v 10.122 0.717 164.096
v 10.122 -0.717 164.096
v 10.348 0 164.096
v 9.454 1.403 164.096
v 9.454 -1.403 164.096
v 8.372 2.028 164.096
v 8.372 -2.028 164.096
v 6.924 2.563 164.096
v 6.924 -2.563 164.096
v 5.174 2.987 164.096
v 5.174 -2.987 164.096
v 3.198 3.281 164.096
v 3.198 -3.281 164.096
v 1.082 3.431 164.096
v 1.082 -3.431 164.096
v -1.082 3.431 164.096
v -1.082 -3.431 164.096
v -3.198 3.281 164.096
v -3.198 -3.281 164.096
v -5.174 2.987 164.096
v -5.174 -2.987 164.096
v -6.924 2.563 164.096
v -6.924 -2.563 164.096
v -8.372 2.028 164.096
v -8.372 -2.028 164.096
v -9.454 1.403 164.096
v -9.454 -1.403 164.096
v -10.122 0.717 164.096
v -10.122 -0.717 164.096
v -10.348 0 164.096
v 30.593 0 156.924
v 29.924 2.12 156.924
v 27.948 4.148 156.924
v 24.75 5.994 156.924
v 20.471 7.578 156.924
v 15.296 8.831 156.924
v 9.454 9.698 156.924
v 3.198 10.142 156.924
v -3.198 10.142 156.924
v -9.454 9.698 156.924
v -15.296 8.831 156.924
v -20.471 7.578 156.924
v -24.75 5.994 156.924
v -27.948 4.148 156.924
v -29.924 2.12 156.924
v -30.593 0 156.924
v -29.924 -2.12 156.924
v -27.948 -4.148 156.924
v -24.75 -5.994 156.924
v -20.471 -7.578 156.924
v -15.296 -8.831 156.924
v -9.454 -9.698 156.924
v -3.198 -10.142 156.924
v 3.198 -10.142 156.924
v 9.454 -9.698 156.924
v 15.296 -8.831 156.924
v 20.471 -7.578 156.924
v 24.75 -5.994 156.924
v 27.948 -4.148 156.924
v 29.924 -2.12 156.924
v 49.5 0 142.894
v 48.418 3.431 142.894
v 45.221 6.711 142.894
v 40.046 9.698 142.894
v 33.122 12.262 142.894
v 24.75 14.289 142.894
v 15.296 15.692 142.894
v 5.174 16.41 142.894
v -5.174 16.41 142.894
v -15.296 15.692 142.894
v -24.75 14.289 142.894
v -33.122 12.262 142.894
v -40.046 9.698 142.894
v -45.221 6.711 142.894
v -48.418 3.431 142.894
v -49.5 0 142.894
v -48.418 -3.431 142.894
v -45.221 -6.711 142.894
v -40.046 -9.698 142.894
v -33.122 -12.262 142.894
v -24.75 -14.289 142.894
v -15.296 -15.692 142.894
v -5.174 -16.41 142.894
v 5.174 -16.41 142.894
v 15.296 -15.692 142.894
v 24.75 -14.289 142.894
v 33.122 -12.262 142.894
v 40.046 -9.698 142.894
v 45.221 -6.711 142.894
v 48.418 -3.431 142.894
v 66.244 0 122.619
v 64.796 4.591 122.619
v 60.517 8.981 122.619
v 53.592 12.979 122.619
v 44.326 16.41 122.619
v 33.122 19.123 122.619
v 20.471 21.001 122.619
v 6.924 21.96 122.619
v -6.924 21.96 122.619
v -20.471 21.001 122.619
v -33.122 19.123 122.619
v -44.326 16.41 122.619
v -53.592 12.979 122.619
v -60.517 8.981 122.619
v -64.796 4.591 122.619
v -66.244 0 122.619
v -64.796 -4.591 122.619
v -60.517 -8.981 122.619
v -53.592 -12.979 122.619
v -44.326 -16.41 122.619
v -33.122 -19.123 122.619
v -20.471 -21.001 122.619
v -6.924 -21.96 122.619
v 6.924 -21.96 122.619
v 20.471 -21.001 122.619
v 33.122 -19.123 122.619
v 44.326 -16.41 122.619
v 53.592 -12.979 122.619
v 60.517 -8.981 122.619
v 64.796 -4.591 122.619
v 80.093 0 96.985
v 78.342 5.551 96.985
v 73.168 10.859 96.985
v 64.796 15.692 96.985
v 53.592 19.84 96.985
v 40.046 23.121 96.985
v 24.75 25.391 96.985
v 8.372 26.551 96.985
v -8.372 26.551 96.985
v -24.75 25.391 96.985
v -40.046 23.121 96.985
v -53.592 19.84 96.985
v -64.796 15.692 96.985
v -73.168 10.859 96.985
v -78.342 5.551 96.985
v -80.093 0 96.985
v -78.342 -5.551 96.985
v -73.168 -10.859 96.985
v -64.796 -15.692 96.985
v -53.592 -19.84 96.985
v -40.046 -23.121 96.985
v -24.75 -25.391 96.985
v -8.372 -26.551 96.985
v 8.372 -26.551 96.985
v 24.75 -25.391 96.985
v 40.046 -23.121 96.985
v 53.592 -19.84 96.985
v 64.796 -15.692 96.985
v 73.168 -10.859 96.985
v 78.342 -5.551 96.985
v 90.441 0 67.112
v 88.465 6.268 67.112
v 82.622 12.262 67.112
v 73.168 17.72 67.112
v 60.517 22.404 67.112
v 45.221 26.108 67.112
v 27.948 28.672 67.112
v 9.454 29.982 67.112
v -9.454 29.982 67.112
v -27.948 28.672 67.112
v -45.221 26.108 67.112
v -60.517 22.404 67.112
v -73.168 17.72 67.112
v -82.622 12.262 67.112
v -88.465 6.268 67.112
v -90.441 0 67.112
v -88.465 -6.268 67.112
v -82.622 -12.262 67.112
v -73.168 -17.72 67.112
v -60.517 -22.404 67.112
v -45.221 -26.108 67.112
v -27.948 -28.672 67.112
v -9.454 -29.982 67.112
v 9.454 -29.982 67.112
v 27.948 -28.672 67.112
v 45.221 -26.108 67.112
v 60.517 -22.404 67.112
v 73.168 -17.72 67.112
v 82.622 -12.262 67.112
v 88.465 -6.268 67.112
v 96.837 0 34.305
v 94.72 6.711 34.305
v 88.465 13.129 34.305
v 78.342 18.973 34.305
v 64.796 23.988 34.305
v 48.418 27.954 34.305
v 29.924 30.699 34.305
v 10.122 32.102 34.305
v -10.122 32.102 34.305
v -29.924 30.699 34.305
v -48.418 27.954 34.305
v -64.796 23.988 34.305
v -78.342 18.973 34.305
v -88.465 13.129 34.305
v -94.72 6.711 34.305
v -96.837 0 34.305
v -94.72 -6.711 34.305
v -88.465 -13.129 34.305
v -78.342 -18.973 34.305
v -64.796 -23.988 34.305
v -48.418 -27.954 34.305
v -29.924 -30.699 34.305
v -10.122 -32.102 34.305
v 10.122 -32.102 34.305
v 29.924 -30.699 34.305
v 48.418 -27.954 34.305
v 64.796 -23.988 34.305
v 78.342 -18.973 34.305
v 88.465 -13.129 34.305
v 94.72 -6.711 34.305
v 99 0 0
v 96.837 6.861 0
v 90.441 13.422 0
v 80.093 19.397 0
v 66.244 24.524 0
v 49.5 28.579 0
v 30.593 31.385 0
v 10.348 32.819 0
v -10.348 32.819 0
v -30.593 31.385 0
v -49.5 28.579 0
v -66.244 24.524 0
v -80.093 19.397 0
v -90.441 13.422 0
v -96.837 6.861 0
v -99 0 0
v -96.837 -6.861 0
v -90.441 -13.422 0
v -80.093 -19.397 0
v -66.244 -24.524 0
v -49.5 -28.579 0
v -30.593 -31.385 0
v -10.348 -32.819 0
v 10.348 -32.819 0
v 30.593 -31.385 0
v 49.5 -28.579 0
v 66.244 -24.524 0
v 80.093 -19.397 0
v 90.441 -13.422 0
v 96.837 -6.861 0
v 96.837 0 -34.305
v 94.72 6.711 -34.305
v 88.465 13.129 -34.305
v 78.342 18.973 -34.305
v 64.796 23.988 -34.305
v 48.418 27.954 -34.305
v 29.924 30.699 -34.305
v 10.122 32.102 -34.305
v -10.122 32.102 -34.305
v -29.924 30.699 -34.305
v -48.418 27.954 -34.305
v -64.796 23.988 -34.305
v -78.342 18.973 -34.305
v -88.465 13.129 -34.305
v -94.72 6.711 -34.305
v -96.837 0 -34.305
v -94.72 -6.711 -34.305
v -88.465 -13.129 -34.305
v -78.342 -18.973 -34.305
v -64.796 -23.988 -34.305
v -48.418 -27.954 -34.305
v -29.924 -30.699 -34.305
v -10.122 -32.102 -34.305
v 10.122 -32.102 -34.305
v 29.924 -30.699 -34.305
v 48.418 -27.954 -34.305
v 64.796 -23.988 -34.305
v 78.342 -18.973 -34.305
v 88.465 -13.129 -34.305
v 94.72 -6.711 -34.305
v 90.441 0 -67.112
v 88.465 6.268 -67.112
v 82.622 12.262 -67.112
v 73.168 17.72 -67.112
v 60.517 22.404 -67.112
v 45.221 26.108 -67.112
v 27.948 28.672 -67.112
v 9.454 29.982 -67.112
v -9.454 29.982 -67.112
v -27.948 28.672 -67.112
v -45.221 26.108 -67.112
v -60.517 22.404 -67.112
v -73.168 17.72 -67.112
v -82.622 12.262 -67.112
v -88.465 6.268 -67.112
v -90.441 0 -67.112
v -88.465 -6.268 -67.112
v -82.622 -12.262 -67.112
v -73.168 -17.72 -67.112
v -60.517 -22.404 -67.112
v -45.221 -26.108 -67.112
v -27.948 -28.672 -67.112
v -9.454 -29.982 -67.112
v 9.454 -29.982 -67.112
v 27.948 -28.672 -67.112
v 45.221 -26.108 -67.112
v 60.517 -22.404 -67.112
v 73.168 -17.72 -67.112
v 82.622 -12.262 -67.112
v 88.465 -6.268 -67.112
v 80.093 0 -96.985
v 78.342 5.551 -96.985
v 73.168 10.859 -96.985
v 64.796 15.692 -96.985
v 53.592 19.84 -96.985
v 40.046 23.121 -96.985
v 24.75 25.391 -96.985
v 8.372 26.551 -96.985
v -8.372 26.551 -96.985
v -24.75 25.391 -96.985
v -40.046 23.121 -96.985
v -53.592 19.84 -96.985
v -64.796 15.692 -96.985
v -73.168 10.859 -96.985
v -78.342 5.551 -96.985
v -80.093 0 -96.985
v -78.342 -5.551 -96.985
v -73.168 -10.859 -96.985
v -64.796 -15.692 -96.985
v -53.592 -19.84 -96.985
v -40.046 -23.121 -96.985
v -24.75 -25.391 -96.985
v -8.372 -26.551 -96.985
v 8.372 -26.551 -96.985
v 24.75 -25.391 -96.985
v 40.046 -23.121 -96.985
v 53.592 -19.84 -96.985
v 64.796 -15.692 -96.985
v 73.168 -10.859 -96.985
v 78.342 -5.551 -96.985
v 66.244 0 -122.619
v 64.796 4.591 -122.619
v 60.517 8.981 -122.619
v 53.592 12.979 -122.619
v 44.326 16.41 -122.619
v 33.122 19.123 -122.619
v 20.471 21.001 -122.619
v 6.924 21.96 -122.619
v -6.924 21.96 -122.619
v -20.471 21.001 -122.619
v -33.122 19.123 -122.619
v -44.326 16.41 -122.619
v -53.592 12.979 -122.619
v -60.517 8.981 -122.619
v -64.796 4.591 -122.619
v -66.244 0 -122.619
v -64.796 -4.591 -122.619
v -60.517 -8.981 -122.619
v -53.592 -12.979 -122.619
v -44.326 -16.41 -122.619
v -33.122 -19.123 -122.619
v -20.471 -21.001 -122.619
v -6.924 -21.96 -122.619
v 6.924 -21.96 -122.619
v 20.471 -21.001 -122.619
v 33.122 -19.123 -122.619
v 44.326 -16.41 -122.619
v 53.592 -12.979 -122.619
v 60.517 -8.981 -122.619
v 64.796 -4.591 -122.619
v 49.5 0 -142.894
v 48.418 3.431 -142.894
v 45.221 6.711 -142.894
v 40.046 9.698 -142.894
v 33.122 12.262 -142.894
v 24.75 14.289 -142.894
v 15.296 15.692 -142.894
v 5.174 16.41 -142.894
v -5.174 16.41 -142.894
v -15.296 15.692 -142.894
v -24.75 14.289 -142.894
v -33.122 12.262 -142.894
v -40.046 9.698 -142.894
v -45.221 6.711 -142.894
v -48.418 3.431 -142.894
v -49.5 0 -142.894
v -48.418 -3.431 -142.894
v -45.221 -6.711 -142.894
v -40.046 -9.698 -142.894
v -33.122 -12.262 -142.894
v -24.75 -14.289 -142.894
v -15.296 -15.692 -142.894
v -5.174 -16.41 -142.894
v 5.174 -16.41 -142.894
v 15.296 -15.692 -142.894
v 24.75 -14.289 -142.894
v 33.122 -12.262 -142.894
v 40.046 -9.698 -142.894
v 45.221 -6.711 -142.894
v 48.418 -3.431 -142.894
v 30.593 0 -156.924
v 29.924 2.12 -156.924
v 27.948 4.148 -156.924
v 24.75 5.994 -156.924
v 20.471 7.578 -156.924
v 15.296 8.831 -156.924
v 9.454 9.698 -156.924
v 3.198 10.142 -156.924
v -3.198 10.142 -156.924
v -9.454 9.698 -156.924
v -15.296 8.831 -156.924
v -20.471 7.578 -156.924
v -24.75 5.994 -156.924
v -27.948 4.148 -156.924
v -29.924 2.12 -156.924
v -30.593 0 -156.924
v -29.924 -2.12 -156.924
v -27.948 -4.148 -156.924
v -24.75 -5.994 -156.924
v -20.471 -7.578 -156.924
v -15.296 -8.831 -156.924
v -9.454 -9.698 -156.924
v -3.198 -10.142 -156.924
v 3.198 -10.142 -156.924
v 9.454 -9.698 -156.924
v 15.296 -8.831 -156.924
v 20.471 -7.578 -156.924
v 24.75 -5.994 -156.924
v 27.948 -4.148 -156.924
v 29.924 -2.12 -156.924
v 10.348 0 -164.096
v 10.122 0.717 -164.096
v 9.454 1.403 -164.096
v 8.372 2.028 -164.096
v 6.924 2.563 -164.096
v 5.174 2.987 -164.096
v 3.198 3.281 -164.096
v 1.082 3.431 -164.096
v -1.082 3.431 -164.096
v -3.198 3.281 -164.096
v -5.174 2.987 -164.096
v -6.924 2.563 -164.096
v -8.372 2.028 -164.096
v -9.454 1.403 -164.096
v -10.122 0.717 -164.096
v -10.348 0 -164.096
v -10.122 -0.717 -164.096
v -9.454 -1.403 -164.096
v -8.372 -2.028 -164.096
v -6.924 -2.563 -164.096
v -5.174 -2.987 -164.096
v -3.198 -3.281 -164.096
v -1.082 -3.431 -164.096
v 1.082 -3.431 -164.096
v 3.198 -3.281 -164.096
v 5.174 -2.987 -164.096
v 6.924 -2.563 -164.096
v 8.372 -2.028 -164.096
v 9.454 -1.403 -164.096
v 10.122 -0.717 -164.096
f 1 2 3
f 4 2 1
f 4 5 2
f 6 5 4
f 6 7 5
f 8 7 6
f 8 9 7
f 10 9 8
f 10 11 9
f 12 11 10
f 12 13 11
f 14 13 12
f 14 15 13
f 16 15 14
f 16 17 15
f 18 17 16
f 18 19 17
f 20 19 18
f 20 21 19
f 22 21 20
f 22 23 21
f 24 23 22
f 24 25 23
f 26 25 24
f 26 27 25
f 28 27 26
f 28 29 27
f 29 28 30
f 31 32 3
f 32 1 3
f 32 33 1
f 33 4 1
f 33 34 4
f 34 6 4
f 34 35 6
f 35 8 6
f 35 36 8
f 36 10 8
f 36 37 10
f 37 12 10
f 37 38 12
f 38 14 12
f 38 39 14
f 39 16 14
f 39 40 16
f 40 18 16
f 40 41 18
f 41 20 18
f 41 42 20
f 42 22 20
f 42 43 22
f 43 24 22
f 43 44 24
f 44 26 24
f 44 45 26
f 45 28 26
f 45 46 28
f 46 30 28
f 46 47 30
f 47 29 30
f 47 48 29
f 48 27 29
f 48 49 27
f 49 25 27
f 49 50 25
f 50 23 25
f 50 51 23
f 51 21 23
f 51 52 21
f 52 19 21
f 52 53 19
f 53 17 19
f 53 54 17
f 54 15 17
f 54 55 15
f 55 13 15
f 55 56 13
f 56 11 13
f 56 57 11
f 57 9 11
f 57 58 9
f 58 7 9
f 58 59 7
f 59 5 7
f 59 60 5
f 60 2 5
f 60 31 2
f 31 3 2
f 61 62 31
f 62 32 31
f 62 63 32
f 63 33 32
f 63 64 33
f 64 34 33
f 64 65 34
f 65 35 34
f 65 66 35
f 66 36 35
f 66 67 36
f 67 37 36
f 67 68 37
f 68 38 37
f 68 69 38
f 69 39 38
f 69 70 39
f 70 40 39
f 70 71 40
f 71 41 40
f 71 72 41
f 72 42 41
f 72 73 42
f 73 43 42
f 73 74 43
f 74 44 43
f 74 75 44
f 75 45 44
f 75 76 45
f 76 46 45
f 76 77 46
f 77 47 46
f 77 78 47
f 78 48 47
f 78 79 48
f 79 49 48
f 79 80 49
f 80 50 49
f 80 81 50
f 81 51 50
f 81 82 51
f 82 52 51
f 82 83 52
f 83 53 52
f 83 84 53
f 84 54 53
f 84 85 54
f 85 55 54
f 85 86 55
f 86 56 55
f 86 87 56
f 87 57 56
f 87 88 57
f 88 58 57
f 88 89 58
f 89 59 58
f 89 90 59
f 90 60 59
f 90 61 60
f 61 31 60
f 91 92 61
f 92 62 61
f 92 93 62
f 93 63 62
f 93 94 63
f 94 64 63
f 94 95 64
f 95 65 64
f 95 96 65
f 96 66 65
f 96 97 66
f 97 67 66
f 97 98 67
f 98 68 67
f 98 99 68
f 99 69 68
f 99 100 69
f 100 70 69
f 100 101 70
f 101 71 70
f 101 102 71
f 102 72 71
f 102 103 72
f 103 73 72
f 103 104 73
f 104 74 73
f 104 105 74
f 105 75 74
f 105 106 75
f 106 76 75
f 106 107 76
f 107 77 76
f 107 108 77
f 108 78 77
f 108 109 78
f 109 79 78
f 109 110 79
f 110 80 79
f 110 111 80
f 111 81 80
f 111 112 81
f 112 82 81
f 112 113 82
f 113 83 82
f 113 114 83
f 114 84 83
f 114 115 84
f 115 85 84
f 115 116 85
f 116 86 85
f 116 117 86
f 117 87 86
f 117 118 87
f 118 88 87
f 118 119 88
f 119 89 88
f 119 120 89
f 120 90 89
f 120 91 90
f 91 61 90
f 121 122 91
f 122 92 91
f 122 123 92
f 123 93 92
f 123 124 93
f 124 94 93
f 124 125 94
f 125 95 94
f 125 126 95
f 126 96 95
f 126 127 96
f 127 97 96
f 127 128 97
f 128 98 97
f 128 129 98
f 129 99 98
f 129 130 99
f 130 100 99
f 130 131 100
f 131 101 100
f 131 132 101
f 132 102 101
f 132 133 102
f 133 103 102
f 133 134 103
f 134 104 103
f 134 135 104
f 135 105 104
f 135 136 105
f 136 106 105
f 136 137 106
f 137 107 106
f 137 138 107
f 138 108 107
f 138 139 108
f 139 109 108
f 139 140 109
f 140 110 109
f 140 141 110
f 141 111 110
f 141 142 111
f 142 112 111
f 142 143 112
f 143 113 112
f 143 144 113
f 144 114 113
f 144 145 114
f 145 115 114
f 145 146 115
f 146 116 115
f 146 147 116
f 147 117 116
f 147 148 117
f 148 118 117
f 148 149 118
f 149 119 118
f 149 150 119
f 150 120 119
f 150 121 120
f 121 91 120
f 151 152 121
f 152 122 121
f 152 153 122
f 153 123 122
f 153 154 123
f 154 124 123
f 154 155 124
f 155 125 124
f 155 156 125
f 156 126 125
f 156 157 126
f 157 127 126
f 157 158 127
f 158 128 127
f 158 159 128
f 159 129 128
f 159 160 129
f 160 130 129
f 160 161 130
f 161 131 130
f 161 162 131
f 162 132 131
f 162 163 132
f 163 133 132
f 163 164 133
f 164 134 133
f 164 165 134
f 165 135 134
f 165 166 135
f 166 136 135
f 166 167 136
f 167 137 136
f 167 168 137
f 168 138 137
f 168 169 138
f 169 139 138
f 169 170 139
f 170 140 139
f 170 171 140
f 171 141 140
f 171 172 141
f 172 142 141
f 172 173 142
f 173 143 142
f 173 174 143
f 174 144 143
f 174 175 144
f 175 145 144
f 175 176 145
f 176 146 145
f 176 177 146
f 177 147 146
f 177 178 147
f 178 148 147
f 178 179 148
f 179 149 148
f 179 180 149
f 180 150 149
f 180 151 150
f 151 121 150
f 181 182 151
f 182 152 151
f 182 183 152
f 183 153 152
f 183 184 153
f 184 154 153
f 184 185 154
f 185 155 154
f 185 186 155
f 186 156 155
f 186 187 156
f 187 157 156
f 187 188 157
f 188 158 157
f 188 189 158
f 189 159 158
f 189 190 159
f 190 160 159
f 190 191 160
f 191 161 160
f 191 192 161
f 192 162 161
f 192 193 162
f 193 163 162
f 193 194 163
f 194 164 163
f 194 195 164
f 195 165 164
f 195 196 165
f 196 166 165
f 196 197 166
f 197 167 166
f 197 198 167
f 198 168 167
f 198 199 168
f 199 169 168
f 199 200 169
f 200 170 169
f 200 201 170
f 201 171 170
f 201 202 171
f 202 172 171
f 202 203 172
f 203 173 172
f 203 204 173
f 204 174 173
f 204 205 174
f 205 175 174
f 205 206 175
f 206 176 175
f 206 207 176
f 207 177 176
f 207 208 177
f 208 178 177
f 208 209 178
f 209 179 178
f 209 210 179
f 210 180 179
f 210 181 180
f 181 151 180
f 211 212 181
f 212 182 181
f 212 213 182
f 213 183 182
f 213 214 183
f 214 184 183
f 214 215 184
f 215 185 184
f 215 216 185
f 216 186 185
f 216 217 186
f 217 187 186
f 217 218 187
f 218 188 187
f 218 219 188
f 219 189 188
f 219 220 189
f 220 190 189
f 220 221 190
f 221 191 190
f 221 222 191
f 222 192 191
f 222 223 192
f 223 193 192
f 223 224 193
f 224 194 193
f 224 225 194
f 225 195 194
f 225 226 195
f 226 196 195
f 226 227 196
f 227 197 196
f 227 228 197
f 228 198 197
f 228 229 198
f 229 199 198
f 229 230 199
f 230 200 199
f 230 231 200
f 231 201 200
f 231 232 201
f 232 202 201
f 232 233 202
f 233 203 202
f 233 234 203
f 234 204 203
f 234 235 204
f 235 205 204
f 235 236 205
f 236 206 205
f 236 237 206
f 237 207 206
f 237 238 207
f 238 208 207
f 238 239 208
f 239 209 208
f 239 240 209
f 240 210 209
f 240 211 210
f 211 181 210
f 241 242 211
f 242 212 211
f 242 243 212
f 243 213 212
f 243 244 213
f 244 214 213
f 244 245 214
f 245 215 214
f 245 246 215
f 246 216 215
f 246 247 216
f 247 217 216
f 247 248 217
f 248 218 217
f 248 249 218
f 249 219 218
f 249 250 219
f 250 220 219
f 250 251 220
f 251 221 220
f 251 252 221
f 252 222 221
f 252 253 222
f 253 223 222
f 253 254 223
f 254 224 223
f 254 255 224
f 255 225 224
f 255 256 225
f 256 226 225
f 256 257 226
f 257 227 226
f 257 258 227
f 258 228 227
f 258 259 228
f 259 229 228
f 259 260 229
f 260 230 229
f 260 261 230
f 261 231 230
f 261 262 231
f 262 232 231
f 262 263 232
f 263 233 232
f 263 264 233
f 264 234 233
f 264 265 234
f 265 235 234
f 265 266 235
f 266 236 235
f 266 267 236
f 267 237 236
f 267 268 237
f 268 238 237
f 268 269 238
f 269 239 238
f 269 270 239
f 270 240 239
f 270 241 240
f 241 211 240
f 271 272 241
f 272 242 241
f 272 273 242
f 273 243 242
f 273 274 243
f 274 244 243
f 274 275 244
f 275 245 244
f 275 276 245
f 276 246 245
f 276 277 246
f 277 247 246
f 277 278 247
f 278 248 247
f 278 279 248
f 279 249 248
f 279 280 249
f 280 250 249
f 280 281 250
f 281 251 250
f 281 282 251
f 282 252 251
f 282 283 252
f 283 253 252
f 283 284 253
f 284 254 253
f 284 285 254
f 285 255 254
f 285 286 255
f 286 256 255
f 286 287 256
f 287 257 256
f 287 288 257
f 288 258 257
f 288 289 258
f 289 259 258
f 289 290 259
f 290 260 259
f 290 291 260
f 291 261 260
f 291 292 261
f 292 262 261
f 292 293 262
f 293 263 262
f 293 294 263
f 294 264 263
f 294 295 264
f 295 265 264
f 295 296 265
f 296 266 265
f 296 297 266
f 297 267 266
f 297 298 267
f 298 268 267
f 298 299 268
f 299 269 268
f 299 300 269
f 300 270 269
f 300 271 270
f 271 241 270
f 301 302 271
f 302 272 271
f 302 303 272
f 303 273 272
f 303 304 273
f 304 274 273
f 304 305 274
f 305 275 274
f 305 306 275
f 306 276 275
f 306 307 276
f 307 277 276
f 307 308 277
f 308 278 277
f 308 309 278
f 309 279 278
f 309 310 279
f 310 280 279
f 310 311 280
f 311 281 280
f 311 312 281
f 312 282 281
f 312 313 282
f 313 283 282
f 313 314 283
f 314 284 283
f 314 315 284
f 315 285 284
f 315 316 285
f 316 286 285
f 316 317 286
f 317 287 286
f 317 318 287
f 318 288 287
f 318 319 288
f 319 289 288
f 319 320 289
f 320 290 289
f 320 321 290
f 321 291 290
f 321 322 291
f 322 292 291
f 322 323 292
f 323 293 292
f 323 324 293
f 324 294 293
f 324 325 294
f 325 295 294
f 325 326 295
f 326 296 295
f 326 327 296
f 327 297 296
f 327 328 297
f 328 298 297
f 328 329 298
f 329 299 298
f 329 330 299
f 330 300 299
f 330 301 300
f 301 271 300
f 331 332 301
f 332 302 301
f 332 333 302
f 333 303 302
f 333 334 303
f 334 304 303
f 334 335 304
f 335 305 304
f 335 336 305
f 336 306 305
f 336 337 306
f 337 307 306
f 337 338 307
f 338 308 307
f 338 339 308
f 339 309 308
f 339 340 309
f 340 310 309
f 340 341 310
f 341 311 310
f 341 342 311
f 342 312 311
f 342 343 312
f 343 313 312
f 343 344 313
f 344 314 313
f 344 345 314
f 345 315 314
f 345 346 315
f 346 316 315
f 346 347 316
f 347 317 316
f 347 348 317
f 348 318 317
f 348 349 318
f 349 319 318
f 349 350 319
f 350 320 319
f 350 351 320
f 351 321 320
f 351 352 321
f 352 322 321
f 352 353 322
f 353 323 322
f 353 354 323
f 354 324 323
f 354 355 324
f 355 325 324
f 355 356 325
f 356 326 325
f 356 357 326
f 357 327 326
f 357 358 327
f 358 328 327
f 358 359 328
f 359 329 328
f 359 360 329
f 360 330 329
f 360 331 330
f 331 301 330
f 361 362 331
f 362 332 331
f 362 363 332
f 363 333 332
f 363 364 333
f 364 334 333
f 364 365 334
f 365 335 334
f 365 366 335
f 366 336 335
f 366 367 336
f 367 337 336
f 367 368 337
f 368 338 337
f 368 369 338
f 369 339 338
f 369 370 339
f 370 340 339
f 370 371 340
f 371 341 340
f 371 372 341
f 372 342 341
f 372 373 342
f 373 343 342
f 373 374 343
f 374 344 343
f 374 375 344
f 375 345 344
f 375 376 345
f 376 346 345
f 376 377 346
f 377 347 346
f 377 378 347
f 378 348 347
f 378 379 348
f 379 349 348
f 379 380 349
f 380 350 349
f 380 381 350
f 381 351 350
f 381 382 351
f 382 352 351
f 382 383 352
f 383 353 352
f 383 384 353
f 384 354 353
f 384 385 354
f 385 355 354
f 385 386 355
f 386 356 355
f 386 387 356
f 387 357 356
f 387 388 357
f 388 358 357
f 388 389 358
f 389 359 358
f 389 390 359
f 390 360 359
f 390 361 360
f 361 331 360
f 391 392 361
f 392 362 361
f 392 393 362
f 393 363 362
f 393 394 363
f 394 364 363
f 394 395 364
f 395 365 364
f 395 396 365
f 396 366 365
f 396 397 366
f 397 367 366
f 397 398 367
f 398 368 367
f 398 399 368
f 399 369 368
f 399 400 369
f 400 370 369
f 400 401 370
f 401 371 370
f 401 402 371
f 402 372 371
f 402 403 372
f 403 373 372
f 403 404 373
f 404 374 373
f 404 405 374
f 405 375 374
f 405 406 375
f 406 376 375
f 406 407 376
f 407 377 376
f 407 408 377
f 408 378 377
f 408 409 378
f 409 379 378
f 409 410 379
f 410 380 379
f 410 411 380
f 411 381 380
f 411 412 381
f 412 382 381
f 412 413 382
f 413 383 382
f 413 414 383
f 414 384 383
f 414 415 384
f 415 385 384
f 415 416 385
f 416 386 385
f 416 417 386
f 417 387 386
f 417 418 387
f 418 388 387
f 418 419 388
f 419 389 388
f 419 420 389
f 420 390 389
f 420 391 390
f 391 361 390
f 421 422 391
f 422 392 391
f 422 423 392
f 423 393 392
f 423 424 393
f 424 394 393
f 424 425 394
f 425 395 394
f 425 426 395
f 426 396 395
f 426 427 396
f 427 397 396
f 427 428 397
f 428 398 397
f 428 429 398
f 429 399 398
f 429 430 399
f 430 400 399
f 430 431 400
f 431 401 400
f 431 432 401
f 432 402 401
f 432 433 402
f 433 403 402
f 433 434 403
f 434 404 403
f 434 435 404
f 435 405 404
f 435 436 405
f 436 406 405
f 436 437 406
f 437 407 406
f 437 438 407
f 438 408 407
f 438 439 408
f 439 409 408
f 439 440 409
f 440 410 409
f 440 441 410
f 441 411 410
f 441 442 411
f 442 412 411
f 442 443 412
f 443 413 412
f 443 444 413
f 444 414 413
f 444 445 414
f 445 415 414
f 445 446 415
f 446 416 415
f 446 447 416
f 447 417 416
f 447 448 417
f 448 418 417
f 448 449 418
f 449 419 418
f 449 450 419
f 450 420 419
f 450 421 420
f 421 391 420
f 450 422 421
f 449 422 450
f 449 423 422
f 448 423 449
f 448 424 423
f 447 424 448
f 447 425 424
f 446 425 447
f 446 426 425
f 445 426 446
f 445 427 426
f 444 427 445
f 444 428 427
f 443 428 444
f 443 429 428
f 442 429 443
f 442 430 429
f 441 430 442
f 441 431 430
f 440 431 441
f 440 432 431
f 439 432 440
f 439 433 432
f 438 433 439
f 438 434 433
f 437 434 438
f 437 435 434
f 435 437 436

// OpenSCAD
// Generated by SolidPython 1.0.1 on 2020-07-29 00:46:48


scale(v = [9, 3, 15]) {
	sphere(r = 11);
}
/***********************************************
*********      SolidPython code:      **********
************************************************
 
# import packages: SolidPython
from solid import *
from solid.utils import *
from itertools import chain, combinations, permutations


class Resize:

    def __init__(self, scad_file):
        self.scad_file = scad_file
        #self.scad_file = import_scad(scad_file)
        # cone/cylinder param:
        self.r1 = 0
        self.r2 = 0
        self.h = 0
        # rectangular prism param:
        self.w = 0
        self.l = 0
        # ellipse param:
        self.r = 0

    # import OpenScad code (file name corresponds to shape)


    # classify shape + parameters
    def assign(self, param1, param2, param3):
        if self.scad_file == 'cone.scad':
            self.r1 = param1
            self.r2 = param2
            self.h = param3
        elif self.scad_file == 'cylinder.scad':
            self.r1 = param1
            self.r2 = param2
            self.h = param3
        elif self.scad_file == 'rectangularPrism.scad':
            self.h = param1
            self.l = param2
            self.w = param3
        else:
            self.r = param1
            self.h = param2

    # resize parameters
    def iterate(self):
        x = range(3, 20, 2)
        i = 1
        if self.scad_file == 'cone.scad':
            tempList = list(permutations(x, 2))
            for temp in tempList:
                param1 = temp[0]
                param2 = temp[1]
                filepath = 'produced_scad_files/' + 'cone' + str(param1) + '_' + str(param2) + '_' + '.scad'
                scad_render_to_file(cylinder(h=param1, r1=param2, r2=0), filepath)

        elif self.scad_file == 'cylinder.scad':
            tempList = list(permutations(x, 3))
            for temp in tempList:
                param1 = temp[0]
                param2 = temp[1]
                filepath = 'produced_scad_files/' + 'cylinder' + str(param1) + '_' + str(param2) + '_' + '.scad'
                scad_render_to_file(cylinder(h=param1, r1=param2, r2=param2), filepath)

        elif self.scad_file == 'rectangularPrism.scad':
            tempList = list(permutations(x, 3))
            for temp in tempList:
                param1 = temp[0]
                param2 = temp[1]
                param3 = temp[2]
                filepath = 'produced_scad_files/' + 'rectangularPrism' + str(param1) + '_' + str(param2) + '_' + str(
                    param3) + '.scad'
                scad_render_to_file(cube(size=(param1, param2, param3)), filepath)

        elif self.scad_file == 'ellipse.scad':
            tempList = list(permutations(x, 4))
            for temp in tempList:
                param1 = temp[0]
                param2 = temp[1]
                param3 = temp[2]
                param4 = temp[3]
                filepath = 'produced_scad_files/' + 'ellipse' + str(param1) + '_' + str(param2) + '_' + str(param3) + '_' + str(param4) + '.scad'
                scad_render_to_file(scale([param1, param2, param3])(sphere(r=param4)), filepath)

    def render_to_scadfile(self):
        scad_render_to_file(scad, 'example.scad') 
 
************************************************/
